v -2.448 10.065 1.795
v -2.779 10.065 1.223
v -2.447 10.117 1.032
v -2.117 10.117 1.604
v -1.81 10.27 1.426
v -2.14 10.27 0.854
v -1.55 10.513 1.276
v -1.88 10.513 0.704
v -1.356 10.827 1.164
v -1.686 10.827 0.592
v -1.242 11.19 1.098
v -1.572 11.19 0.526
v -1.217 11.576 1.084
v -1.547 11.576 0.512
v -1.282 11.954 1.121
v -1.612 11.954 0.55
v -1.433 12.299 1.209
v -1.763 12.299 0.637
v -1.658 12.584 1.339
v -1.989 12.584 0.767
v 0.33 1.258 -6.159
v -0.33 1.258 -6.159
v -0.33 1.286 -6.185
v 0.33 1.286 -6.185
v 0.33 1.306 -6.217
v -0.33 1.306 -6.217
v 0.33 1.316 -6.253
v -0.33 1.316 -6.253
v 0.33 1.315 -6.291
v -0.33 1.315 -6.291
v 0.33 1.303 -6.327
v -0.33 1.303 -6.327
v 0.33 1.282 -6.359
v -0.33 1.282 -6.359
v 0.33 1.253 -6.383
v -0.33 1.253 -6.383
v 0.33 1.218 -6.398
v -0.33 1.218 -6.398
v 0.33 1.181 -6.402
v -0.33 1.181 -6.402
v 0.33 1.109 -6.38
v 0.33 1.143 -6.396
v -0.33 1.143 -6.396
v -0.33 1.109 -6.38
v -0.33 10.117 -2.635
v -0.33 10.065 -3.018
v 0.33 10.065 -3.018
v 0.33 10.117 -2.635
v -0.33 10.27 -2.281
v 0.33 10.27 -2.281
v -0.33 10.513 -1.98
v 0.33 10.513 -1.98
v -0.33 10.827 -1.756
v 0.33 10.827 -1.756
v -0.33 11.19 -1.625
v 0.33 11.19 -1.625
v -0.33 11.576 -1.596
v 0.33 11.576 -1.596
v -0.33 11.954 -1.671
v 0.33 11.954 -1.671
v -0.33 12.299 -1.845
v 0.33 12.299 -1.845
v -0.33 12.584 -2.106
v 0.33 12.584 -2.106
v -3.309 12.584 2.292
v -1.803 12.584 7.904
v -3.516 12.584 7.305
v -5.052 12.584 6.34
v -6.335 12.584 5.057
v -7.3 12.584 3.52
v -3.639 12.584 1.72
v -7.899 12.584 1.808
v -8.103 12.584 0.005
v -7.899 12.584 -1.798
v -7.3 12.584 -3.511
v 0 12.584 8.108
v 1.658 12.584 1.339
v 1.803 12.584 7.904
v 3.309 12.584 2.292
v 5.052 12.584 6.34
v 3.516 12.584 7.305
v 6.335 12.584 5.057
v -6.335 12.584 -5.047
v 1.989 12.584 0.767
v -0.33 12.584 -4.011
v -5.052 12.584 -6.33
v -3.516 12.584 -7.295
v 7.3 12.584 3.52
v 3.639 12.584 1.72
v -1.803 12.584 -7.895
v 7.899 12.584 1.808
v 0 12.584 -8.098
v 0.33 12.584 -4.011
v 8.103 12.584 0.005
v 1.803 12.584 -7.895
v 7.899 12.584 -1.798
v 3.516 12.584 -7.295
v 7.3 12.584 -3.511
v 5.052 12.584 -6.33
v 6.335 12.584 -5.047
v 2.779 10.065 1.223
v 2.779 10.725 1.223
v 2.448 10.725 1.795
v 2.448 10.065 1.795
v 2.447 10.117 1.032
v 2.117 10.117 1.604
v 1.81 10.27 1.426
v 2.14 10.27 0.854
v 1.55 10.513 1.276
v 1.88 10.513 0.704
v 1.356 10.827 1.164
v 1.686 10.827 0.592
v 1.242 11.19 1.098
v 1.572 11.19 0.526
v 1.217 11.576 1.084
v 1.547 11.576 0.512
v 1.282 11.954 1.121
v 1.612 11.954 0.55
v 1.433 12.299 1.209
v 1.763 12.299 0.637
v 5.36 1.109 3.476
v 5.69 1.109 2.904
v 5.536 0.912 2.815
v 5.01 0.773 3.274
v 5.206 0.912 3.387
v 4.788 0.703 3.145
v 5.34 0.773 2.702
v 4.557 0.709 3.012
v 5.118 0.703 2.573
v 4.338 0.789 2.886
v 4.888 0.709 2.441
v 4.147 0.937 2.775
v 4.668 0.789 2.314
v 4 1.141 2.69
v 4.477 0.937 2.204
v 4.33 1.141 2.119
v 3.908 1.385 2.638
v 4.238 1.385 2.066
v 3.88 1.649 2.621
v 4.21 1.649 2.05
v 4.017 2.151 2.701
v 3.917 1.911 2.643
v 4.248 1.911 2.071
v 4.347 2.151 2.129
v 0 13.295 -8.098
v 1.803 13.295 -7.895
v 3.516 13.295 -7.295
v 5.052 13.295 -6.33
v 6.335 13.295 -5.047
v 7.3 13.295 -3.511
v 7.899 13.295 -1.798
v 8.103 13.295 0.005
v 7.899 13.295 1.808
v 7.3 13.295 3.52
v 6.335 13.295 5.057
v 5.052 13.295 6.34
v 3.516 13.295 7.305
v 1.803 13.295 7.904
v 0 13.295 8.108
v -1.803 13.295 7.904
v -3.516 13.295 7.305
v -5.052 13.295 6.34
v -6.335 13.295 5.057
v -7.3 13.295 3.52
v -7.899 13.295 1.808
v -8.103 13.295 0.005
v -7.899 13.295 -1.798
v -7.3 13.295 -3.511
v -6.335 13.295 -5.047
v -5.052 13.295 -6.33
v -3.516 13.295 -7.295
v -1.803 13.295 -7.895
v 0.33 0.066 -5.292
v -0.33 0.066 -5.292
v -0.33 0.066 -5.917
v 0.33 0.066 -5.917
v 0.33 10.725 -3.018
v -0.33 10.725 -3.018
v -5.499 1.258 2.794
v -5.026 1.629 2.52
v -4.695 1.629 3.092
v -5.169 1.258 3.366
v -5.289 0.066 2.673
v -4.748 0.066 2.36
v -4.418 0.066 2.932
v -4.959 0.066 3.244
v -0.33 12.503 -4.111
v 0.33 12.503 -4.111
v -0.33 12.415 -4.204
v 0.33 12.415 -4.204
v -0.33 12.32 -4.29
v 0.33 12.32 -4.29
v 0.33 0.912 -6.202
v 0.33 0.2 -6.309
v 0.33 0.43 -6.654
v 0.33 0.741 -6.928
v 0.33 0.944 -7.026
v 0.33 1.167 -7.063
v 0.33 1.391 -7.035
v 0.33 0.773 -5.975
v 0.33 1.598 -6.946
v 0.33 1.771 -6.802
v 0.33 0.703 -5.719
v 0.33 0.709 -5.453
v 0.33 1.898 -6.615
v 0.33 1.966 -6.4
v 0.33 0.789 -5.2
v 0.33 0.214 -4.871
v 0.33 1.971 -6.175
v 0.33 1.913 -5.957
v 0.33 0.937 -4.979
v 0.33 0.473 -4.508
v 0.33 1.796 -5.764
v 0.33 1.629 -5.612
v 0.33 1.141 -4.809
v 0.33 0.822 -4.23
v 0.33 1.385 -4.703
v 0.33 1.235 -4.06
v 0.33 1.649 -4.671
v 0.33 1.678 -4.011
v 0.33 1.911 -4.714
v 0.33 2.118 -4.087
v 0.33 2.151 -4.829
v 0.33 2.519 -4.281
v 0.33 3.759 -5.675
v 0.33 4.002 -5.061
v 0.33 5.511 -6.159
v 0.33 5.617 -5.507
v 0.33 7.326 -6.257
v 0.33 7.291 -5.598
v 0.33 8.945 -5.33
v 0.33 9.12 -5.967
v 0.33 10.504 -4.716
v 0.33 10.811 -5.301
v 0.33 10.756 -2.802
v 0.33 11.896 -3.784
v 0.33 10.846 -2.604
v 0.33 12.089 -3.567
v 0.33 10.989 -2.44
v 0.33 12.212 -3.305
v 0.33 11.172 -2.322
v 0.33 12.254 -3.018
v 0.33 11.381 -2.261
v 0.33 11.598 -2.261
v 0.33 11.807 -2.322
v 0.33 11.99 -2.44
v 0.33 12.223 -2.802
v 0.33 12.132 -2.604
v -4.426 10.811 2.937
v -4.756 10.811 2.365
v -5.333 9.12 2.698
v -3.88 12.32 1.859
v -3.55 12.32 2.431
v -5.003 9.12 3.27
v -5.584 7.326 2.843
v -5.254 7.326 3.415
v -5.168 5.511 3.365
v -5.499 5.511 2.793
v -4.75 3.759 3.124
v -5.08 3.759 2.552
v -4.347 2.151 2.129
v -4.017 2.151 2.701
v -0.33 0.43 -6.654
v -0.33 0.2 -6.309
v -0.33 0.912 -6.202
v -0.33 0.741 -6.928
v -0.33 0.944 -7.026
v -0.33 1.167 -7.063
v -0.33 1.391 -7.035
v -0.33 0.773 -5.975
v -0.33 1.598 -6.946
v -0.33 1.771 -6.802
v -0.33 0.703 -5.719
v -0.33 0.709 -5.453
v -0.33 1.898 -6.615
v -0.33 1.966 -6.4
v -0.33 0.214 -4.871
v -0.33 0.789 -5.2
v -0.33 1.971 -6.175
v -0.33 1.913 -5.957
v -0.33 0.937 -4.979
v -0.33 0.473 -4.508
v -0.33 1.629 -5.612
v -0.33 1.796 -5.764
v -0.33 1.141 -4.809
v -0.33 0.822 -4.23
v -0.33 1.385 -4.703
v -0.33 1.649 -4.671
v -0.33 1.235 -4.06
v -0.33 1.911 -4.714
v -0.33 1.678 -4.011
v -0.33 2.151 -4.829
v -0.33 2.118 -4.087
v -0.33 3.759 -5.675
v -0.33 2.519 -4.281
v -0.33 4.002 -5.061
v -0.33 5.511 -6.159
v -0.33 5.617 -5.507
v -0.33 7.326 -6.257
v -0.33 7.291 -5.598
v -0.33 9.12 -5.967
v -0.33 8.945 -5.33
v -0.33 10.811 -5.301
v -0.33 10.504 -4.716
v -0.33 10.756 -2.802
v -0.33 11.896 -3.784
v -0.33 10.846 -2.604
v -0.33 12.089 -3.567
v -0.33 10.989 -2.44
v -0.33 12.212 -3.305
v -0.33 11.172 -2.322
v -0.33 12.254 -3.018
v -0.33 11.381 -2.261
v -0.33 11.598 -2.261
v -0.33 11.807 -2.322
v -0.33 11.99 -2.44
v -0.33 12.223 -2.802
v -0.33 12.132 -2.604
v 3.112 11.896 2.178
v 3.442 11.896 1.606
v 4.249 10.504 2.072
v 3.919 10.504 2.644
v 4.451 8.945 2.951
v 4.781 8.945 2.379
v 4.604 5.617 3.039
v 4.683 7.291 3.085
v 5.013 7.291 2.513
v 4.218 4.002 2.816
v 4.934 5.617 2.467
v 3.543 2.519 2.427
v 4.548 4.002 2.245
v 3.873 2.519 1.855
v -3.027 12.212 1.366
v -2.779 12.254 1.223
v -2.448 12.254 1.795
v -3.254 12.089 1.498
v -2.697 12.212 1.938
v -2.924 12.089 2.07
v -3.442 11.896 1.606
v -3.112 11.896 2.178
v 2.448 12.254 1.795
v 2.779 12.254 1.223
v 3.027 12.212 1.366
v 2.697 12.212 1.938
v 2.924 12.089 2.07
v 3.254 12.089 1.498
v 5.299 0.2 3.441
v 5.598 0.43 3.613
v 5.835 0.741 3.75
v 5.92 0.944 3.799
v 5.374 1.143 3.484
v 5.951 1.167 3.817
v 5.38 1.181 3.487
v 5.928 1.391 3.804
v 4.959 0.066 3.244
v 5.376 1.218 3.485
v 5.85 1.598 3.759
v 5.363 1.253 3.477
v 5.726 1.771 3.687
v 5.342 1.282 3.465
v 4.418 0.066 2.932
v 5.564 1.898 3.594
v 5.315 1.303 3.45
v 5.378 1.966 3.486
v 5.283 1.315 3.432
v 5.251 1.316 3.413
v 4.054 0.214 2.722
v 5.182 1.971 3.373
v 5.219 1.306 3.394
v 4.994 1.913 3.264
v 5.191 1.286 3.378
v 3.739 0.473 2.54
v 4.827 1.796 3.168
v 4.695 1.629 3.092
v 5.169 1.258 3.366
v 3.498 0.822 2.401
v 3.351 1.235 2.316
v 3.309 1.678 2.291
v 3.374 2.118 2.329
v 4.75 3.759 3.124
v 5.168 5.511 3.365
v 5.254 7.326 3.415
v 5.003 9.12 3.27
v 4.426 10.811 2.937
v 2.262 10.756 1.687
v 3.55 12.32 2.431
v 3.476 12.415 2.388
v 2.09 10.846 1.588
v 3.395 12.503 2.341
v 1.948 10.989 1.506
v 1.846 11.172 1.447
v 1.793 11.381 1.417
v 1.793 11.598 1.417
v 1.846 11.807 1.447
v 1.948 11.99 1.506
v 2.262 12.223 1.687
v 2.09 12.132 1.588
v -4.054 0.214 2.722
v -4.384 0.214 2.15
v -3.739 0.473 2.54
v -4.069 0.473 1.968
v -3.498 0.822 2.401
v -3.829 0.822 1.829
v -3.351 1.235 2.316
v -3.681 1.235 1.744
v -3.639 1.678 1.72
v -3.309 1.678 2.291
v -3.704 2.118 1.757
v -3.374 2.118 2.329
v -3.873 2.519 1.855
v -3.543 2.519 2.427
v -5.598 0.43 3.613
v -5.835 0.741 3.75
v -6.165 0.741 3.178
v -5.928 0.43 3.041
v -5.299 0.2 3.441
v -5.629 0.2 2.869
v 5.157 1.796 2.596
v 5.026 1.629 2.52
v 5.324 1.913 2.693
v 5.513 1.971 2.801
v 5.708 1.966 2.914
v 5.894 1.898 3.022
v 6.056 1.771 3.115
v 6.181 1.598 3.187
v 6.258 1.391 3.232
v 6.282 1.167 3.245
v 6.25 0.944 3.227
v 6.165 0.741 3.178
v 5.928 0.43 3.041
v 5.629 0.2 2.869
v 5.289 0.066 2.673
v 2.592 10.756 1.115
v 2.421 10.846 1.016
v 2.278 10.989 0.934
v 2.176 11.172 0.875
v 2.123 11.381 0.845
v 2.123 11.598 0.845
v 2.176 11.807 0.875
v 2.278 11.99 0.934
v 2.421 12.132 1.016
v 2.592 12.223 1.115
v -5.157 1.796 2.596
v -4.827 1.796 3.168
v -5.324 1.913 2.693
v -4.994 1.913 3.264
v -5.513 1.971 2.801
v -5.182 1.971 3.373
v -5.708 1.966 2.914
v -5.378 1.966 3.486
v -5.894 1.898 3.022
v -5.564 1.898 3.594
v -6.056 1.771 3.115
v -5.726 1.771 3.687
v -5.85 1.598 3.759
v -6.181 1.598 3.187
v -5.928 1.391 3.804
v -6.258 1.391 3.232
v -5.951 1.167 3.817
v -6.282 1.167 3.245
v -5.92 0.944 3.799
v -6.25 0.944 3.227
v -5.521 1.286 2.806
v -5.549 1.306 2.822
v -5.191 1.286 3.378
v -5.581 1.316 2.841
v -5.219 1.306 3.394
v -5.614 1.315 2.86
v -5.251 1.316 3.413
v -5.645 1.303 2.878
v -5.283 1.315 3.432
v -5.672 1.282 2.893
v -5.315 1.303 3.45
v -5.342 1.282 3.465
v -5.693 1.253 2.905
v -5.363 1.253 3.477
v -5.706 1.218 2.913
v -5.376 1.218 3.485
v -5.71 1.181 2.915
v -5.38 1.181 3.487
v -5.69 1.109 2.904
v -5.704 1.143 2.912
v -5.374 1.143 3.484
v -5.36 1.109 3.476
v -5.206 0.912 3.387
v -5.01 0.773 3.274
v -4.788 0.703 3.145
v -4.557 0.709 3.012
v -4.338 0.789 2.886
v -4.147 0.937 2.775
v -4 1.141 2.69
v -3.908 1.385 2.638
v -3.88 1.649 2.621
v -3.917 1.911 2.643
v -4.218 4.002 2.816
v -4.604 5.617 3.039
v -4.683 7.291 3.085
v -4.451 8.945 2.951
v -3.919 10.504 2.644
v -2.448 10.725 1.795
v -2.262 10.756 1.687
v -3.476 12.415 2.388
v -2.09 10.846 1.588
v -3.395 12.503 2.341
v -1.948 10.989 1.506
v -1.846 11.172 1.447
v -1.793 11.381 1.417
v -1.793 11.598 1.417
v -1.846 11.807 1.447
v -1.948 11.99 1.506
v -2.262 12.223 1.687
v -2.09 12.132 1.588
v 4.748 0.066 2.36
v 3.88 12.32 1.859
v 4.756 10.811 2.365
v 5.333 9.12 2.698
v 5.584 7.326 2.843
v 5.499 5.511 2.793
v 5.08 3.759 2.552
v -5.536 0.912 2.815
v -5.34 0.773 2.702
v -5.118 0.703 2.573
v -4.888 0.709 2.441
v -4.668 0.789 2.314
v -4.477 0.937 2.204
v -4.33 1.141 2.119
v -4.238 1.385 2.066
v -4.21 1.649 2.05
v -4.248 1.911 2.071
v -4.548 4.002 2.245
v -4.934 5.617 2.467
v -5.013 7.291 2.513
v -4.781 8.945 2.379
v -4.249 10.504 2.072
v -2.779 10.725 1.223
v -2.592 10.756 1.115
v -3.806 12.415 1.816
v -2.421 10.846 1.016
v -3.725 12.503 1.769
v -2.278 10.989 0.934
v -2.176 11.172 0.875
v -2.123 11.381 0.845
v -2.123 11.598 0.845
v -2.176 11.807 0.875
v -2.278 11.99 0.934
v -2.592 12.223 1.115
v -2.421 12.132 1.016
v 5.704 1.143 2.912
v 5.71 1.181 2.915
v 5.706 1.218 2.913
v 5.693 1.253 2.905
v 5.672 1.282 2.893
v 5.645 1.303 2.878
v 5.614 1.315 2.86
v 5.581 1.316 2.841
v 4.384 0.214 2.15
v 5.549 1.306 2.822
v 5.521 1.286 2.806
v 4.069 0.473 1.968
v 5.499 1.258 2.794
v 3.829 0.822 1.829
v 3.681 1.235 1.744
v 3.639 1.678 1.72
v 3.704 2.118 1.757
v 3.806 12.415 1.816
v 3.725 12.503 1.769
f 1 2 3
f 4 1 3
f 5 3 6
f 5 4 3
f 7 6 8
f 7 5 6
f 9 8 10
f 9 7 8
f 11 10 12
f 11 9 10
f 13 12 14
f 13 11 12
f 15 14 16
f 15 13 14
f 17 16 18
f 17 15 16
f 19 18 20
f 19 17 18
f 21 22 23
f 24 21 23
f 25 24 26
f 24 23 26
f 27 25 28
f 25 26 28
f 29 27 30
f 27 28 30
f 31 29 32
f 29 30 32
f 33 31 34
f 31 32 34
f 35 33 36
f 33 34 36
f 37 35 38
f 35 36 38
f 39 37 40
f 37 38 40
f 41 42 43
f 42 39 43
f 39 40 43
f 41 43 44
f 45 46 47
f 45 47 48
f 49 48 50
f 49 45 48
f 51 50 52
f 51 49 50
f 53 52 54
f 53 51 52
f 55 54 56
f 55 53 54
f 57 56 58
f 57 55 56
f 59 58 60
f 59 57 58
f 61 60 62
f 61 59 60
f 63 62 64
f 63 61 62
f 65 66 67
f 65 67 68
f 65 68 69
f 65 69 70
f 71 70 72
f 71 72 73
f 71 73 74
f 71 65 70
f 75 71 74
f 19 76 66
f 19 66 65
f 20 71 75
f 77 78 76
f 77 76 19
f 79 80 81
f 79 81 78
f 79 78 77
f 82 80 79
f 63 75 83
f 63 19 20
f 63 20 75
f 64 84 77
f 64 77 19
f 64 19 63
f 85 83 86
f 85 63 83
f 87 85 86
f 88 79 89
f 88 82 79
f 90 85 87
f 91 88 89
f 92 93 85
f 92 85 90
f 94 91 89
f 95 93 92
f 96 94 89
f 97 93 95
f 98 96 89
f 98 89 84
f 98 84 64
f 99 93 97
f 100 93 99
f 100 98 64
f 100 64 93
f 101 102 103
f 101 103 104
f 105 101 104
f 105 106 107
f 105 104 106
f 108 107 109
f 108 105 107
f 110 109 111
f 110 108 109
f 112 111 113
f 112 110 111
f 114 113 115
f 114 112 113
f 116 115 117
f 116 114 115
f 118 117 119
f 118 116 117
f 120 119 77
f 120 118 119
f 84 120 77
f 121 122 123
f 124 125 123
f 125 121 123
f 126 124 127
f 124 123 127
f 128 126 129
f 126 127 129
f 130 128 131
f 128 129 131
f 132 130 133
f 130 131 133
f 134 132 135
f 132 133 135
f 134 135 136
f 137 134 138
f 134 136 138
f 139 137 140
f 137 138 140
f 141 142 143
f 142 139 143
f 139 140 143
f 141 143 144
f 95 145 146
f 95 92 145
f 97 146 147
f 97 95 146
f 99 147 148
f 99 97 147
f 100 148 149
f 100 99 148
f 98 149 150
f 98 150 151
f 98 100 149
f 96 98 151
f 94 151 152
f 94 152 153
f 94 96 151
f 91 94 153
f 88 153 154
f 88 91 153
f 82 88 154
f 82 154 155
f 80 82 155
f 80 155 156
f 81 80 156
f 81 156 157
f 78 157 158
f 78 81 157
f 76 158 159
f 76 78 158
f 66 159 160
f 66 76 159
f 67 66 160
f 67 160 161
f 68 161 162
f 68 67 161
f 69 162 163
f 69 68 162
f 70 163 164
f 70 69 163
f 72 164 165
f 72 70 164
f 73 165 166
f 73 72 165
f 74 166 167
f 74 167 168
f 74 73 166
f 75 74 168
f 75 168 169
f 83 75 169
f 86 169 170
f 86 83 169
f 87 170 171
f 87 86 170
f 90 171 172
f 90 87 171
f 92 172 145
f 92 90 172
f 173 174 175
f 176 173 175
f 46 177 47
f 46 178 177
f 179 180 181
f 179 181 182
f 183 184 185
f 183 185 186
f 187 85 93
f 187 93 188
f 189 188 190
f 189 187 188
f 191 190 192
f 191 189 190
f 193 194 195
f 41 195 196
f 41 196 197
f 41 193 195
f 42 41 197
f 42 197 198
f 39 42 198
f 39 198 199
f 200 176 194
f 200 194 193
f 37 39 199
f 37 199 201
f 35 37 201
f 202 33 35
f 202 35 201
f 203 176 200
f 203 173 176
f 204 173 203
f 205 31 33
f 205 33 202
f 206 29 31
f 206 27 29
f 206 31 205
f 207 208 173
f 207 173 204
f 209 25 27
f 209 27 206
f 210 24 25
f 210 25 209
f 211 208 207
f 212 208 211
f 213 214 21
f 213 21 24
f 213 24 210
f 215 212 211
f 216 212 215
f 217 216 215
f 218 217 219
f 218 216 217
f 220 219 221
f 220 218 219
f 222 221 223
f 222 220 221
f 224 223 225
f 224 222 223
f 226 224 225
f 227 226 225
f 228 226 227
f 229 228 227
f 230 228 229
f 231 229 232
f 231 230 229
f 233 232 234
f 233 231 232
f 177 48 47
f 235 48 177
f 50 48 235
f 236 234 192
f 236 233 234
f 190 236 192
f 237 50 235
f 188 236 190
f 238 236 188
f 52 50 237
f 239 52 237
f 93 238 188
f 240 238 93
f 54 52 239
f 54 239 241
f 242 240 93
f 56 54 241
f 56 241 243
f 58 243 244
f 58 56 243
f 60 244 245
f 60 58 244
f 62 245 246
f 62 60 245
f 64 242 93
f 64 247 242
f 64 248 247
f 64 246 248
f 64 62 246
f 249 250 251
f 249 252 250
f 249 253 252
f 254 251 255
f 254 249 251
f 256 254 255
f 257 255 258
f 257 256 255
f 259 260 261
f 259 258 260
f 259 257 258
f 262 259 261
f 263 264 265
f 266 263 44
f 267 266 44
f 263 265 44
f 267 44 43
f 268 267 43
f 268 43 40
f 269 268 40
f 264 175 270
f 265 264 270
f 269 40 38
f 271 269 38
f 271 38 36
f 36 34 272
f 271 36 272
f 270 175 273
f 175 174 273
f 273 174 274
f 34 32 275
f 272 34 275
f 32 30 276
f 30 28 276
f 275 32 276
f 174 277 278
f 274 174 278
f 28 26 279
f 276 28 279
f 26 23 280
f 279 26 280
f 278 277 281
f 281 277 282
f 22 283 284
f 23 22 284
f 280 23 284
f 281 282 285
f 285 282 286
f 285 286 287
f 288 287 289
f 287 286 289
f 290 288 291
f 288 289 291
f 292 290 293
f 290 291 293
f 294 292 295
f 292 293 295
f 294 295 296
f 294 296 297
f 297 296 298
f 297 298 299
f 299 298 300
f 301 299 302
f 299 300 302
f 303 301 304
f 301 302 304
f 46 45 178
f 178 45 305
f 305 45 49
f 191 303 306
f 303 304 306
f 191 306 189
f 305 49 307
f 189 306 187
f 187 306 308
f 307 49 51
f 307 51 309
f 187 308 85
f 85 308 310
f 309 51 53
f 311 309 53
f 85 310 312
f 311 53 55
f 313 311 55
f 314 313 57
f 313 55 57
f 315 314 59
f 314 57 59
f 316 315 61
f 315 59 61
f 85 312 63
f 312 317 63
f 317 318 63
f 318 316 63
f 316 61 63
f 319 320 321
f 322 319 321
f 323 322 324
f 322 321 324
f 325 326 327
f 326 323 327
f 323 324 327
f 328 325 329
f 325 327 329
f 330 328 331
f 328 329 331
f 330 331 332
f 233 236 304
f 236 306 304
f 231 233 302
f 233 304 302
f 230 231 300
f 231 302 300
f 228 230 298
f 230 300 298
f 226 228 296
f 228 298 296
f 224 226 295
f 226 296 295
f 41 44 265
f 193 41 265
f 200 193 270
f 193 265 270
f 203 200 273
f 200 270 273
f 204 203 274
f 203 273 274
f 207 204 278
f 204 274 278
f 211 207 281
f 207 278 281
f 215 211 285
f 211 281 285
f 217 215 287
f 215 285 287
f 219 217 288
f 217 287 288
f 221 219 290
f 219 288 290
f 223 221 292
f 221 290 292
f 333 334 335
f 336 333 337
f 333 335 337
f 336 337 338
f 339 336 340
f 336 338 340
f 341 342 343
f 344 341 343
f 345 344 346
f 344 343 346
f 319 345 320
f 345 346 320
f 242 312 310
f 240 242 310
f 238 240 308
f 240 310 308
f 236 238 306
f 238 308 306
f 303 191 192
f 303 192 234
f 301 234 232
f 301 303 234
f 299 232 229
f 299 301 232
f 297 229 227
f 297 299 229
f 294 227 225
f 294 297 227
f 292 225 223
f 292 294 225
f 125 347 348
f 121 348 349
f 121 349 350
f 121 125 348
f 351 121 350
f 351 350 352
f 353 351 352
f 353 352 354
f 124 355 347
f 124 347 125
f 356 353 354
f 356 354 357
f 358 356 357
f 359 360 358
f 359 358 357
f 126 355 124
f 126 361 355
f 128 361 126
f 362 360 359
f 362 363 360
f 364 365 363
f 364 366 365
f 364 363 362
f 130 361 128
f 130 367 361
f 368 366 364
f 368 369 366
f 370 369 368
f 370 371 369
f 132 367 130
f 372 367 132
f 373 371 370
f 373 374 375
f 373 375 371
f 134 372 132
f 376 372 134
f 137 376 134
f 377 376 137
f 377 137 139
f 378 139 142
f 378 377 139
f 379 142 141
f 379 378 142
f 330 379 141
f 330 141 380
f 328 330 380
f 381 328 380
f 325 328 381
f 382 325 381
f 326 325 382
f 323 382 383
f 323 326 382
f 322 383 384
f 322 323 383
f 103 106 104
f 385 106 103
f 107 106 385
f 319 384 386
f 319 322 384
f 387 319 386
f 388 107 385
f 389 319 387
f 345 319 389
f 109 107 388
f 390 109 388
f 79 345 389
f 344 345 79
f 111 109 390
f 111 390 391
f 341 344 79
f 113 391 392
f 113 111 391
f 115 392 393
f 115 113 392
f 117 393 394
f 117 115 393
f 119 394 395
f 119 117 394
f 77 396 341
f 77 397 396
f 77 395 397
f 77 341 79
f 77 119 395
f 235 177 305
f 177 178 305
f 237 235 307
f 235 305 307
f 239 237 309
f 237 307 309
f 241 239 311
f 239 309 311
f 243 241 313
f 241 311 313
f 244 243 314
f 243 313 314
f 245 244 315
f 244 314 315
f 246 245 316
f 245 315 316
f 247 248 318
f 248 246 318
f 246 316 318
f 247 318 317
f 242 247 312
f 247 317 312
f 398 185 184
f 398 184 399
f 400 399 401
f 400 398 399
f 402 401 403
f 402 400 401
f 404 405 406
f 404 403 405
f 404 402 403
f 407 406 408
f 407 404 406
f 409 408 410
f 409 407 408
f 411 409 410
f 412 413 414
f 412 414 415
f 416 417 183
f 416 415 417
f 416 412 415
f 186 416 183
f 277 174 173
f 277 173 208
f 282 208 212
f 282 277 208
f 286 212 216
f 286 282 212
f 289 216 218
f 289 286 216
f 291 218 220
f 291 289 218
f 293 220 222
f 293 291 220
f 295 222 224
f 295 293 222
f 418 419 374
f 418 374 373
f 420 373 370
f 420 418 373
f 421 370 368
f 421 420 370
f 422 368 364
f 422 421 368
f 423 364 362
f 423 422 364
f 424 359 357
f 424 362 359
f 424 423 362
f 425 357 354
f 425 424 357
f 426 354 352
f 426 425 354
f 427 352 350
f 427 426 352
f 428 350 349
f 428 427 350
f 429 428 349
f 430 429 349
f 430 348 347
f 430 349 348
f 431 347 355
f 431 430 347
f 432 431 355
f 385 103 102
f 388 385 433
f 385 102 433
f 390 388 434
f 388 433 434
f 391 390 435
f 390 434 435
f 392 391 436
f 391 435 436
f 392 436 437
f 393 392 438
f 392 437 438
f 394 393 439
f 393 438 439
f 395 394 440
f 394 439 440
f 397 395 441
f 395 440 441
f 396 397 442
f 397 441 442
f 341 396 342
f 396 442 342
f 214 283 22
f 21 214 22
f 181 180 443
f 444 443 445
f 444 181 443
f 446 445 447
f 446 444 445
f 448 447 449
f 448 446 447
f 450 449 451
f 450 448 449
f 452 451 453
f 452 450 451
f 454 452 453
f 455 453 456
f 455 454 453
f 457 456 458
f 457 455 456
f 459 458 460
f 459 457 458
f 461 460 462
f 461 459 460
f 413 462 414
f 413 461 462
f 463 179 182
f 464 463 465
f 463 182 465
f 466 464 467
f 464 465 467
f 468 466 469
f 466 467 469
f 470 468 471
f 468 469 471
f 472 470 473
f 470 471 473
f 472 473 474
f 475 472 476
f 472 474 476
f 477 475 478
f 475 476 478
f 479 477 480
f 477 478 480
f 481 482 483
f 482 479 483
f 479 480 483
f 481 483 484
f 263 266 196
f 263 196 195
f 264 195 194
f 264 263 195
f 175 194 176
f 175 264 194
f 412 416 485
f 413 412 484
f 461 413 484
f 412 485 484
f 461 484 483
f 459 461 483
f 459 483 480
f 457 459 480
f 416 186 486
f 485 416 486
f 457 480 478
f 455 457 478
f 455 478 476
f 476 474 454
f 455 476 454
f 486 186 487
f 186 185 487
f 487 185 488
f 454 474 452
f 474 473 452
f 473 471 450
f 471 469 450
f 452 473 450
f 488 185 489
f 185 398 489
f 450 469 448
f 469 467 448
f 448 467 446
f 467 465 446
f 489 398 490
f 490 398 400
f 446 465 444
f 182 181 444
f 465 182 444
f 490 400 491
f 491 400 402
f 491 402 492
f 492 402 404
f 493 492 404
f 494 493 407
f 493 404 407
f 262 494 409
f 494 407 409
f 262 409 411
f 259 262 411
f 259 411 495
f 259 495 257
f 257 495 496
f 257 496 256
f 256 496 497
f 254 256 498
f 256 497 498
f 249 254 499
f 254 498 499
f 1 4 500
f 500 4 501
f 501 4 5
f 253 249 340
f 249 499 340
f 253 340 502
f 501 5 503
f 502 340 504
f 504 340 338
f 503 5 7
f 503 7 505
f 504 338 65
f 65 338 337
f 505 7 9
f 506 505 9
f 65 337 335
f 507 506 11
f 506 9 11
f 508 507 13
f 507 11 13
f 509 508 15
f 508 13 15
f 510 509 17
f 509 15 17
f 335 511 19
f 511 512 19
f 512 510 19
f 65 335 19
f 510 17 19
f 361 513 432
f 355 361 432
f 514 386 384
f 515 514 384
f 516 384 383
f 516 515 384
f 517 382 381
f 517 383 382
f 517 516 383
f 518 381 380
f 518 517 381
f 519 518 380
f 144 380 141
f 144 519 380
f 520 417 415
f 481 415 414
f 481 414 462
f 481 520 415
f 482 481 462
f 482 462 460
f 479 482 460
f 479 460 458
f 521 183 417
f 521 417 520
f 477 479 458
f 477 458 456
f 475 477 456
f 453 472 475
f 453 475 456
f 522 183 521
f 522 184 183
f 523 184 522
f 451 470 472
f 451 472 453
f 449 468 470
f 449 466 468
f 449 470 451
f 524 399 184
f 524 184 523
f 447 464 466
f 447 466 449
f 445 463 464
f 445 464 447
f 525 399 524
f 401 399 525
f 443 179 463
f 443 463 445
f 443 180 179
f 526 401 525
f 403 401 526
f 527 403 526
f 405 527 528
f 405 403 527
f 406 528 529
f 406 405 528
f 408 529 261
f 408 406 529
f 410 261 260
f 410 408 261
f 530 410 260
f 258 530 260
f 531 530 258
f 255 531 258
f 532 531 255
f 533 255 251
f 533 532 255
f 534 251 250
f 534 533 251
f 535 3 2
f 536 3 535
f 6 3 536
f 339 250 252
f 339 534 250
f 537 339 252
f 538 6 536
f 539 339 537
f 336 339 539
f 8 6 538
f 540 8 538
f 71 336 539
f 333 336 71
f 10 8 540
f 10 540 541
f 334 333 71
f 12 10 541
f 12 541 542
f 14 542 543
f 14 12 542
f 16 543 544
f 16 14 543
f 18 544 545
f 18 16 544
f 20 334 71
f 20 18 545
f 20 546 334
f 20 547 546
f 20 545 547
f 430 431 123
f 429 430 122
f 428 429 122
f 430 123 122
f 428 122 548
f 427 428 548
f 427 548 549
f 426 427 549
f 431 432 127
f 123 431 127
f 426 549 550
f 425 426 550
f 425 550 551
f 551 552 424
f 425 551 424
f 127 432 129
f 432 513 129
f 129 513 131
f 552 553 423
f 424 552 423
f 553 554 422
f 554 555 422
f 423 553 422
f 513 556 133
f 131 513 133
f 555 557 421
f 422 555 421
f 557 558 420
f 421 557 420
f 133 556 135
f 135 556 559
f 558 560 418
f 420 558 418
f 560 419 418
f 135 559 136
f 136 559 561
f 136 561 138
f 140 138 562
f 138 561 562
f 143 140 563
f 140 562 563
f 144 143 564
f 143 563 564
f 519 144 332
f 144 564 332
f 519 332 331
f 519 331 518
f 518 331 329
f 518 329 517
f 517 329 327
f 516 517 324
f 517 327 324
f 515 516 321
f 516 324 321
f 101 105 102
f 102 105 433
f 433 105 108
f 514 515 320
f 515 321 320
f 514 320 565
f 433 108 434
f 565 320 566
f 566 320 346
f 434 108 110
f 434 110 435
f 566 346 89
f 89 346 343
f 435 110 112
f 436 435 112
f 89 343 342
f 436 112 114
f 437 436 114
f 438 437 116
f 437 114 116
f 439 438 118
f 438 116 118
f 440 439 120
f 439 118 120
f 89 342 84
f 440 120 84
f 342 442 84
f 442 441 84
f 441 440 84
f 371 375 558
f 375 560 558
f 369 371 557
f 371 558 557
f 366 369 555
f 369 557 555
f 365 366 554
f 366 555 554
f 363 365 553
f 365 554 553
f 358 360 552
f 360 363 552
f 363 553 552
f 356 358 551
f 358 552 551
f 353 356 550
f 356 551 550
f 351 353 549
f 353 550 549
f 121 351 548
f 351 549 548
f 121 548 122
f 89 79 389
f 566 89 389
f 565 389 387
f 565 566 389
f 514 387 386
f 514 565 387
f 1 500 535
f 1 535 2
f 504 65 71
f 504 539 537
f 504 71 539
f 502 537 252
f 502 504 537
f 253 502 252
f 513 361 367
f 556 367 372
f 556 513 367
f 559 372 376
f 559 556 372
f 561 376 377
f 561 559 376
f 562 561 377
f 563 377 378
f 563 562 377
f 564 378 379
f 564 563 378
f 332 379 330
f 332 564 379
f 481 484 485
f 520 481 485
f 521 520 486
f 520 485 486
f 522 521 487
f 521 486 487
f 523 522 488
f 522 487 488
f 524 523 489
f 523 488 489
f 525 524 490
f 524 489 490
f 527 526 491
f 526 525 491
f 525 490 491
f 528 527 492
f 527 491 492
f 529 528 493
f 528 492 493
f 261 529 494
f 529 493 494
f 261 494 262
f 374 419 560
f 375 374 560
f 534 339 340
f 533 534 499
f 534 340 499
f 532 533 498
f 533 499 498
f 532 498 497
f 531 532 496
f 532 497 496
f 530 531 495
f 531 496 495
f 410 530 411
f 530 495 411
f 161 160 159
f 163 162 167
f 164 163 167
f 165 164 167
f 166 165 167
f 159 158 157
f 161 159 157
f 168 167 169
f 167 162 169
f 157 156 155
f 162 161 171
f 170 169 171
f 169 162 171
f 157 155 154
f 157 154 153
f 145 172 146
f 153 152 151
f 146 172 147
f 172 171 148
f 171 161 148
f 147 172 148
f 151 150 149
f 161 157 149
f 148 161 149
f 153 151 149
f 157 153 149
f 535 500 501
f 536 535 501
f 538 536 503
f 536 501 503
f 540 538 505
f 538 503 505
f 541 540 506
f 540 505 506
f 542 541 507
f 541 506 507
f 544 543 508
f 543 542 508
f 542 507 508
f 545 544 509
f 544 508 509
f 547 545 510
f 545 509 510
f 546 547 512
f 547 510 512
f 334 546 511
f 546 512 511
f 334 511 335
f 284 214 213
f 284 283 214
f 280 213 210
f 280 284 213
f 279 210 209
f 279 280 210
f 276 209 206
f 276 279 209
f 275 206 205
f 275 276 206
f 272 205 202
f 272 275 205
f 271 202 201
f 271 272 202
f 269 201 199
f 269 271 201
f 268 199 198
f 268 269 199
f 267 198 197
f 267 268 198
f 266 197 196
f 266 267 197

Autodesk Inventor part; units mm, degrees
ref_plane "YZ Plane" through (0, 0, 0) normal (1, 0, 0) x (0, 1, 0)
ref_plane "XZ Plane" through (0, 0, 0) normal (0, 1, 0) x (-1, 0, 0)
ref_plane "XY Plane" through (0, 0, 0) normal (0, 0, 1) x (1, 0, 0)
sketch "Sketch1" plane through (0, 0, 0) normal (1, 0, 0) x (0, 1, 0)
  arc A0 (0.7409, -6.9281) -> (1.6287, -5.6125) centre (1.1834, -6.2693) ccw
  line L0 (1.6287, -5.6125) -> (1.2582, -6.1591)
  line L1 (0.7409, -6.9281) -> (1.1092, -6.3799) construction
  line L2 (2.519, -4.2812) -> (2.1507, -4.8294) construction
  arc A1 (1.1092, -6.3799) -> (1.2582, -6.1591) centre (1.1834, -6.2693) ccw
  arc A2 (2.1507, -4.8294) -> (1.1092, -6.3799) centre (1.63, -5.6046) ccw
  arc A3 (2.1507, -4.8294) -> (12.3205, -4.2899) centre (6.8767, 2.206) ccw
  arc A4 (2.519, -4.2812) -> (11.8963, -3.7838) centre (6.8767, 2.206) ccw
  arc A5 (12.3205, -4.2899) -> (12.9142, -3.0177) centre (11.2543, -3.0177) ccw
  arc A6 (11.8963, -3.7838) -> (12.2538, -3.0177) centre (11.2543, -3.0177) ccw
  line L3 (11.8963, -3.7838) -> (12.3205, -4.2899) construction
  line L4 (12.2538, -3.0177) -> (12.9142, -3.0177) construction
  arc A7 (12.2538, -3.0177) -> (10.7251, -3.0177) centre (11.4895, -3.0177) ccw
  line L5 (10.7251, -3.0177) -> (10.0647, -3.0177)
  arc A8 (12.9142, -3.0177) -> (10.0647, -3.0177) centre (11.4895, -3.0177) ccw
  line L6 (0.0665, -5.2922) -> (0.0665, -5.917)
  arc A9 (2.519, -4.2812) -> (0.0665, -5.2922) centre (1.63, -5.6046) ccw
  arc A10 (0.0665, -5.917) -> (0.7409, -6.9281) centre (1.63, -5.6046) ccw
  point P0 (0, 0)
  point P1 (12.584, -3.0177)
  dimension "d10" = 0.6604
  dimension "d11" = 0.6604
  dimension "d12" = 0.6604
  dimension "d15" = 0.6604
extrude "leg" add sketch "Sketch1" along normal mid plane 0.6604
pattern_circular "Circular Pattern1" count 3 over 360 about axis through (0, -10, 0) along (0, 1, 0) of "leg"
sketch "Sketch2" plane through (0, 0, 0) normal (1, 0, 0) x (0, 1, 0)
  arc A0 (11.8963, -3.7838) -> (12.2538, -3.0177) centre (11.2543, -3.0177) ccw projected
  arc A1 (12.3205, -4.2899) -> (12.9142, -3.0177) centre (11.2543, -3.0177) ccw projected
  arc A2 (11.8963, -3.7838) -> (12.2538, -3.0177) centre (11.2543, -3.0177) ccw projected
  line L0 (12.2538, -3.0177) -> (12.9142, -3.0177)
  line L1 (12.584, -3.0177) -> (13.2952, -3.0177) construction
  line L2 (13.2952, -3.0177) -> (13.2952, 0.0049)
  line L3 (13.2952, 0.0049) -> (12.584, 0.0049)
  line L4 (12.584, 0.0049) -> (12.584, -3.0177)
  line L5 (13.2952, -3.0177) -> (13.2952, -8.0977)
  line L6 (13.2952, -8.0977) -> (12.584, -8.0977)
  line L7 (12.584, -8.0977) -> (12.584, -3.0177)
  point P0 (0, 0)
  dimension "d21" = 0.7112
  dimension "d22" = 3.0226
  dimension "d23" = 5.08
revolve "Revolution1" add sketch "Sketch2" angle 360 about axis through (0, 13.2952, 0.0049) along (0, -1, 0)
properties part number "table round"
